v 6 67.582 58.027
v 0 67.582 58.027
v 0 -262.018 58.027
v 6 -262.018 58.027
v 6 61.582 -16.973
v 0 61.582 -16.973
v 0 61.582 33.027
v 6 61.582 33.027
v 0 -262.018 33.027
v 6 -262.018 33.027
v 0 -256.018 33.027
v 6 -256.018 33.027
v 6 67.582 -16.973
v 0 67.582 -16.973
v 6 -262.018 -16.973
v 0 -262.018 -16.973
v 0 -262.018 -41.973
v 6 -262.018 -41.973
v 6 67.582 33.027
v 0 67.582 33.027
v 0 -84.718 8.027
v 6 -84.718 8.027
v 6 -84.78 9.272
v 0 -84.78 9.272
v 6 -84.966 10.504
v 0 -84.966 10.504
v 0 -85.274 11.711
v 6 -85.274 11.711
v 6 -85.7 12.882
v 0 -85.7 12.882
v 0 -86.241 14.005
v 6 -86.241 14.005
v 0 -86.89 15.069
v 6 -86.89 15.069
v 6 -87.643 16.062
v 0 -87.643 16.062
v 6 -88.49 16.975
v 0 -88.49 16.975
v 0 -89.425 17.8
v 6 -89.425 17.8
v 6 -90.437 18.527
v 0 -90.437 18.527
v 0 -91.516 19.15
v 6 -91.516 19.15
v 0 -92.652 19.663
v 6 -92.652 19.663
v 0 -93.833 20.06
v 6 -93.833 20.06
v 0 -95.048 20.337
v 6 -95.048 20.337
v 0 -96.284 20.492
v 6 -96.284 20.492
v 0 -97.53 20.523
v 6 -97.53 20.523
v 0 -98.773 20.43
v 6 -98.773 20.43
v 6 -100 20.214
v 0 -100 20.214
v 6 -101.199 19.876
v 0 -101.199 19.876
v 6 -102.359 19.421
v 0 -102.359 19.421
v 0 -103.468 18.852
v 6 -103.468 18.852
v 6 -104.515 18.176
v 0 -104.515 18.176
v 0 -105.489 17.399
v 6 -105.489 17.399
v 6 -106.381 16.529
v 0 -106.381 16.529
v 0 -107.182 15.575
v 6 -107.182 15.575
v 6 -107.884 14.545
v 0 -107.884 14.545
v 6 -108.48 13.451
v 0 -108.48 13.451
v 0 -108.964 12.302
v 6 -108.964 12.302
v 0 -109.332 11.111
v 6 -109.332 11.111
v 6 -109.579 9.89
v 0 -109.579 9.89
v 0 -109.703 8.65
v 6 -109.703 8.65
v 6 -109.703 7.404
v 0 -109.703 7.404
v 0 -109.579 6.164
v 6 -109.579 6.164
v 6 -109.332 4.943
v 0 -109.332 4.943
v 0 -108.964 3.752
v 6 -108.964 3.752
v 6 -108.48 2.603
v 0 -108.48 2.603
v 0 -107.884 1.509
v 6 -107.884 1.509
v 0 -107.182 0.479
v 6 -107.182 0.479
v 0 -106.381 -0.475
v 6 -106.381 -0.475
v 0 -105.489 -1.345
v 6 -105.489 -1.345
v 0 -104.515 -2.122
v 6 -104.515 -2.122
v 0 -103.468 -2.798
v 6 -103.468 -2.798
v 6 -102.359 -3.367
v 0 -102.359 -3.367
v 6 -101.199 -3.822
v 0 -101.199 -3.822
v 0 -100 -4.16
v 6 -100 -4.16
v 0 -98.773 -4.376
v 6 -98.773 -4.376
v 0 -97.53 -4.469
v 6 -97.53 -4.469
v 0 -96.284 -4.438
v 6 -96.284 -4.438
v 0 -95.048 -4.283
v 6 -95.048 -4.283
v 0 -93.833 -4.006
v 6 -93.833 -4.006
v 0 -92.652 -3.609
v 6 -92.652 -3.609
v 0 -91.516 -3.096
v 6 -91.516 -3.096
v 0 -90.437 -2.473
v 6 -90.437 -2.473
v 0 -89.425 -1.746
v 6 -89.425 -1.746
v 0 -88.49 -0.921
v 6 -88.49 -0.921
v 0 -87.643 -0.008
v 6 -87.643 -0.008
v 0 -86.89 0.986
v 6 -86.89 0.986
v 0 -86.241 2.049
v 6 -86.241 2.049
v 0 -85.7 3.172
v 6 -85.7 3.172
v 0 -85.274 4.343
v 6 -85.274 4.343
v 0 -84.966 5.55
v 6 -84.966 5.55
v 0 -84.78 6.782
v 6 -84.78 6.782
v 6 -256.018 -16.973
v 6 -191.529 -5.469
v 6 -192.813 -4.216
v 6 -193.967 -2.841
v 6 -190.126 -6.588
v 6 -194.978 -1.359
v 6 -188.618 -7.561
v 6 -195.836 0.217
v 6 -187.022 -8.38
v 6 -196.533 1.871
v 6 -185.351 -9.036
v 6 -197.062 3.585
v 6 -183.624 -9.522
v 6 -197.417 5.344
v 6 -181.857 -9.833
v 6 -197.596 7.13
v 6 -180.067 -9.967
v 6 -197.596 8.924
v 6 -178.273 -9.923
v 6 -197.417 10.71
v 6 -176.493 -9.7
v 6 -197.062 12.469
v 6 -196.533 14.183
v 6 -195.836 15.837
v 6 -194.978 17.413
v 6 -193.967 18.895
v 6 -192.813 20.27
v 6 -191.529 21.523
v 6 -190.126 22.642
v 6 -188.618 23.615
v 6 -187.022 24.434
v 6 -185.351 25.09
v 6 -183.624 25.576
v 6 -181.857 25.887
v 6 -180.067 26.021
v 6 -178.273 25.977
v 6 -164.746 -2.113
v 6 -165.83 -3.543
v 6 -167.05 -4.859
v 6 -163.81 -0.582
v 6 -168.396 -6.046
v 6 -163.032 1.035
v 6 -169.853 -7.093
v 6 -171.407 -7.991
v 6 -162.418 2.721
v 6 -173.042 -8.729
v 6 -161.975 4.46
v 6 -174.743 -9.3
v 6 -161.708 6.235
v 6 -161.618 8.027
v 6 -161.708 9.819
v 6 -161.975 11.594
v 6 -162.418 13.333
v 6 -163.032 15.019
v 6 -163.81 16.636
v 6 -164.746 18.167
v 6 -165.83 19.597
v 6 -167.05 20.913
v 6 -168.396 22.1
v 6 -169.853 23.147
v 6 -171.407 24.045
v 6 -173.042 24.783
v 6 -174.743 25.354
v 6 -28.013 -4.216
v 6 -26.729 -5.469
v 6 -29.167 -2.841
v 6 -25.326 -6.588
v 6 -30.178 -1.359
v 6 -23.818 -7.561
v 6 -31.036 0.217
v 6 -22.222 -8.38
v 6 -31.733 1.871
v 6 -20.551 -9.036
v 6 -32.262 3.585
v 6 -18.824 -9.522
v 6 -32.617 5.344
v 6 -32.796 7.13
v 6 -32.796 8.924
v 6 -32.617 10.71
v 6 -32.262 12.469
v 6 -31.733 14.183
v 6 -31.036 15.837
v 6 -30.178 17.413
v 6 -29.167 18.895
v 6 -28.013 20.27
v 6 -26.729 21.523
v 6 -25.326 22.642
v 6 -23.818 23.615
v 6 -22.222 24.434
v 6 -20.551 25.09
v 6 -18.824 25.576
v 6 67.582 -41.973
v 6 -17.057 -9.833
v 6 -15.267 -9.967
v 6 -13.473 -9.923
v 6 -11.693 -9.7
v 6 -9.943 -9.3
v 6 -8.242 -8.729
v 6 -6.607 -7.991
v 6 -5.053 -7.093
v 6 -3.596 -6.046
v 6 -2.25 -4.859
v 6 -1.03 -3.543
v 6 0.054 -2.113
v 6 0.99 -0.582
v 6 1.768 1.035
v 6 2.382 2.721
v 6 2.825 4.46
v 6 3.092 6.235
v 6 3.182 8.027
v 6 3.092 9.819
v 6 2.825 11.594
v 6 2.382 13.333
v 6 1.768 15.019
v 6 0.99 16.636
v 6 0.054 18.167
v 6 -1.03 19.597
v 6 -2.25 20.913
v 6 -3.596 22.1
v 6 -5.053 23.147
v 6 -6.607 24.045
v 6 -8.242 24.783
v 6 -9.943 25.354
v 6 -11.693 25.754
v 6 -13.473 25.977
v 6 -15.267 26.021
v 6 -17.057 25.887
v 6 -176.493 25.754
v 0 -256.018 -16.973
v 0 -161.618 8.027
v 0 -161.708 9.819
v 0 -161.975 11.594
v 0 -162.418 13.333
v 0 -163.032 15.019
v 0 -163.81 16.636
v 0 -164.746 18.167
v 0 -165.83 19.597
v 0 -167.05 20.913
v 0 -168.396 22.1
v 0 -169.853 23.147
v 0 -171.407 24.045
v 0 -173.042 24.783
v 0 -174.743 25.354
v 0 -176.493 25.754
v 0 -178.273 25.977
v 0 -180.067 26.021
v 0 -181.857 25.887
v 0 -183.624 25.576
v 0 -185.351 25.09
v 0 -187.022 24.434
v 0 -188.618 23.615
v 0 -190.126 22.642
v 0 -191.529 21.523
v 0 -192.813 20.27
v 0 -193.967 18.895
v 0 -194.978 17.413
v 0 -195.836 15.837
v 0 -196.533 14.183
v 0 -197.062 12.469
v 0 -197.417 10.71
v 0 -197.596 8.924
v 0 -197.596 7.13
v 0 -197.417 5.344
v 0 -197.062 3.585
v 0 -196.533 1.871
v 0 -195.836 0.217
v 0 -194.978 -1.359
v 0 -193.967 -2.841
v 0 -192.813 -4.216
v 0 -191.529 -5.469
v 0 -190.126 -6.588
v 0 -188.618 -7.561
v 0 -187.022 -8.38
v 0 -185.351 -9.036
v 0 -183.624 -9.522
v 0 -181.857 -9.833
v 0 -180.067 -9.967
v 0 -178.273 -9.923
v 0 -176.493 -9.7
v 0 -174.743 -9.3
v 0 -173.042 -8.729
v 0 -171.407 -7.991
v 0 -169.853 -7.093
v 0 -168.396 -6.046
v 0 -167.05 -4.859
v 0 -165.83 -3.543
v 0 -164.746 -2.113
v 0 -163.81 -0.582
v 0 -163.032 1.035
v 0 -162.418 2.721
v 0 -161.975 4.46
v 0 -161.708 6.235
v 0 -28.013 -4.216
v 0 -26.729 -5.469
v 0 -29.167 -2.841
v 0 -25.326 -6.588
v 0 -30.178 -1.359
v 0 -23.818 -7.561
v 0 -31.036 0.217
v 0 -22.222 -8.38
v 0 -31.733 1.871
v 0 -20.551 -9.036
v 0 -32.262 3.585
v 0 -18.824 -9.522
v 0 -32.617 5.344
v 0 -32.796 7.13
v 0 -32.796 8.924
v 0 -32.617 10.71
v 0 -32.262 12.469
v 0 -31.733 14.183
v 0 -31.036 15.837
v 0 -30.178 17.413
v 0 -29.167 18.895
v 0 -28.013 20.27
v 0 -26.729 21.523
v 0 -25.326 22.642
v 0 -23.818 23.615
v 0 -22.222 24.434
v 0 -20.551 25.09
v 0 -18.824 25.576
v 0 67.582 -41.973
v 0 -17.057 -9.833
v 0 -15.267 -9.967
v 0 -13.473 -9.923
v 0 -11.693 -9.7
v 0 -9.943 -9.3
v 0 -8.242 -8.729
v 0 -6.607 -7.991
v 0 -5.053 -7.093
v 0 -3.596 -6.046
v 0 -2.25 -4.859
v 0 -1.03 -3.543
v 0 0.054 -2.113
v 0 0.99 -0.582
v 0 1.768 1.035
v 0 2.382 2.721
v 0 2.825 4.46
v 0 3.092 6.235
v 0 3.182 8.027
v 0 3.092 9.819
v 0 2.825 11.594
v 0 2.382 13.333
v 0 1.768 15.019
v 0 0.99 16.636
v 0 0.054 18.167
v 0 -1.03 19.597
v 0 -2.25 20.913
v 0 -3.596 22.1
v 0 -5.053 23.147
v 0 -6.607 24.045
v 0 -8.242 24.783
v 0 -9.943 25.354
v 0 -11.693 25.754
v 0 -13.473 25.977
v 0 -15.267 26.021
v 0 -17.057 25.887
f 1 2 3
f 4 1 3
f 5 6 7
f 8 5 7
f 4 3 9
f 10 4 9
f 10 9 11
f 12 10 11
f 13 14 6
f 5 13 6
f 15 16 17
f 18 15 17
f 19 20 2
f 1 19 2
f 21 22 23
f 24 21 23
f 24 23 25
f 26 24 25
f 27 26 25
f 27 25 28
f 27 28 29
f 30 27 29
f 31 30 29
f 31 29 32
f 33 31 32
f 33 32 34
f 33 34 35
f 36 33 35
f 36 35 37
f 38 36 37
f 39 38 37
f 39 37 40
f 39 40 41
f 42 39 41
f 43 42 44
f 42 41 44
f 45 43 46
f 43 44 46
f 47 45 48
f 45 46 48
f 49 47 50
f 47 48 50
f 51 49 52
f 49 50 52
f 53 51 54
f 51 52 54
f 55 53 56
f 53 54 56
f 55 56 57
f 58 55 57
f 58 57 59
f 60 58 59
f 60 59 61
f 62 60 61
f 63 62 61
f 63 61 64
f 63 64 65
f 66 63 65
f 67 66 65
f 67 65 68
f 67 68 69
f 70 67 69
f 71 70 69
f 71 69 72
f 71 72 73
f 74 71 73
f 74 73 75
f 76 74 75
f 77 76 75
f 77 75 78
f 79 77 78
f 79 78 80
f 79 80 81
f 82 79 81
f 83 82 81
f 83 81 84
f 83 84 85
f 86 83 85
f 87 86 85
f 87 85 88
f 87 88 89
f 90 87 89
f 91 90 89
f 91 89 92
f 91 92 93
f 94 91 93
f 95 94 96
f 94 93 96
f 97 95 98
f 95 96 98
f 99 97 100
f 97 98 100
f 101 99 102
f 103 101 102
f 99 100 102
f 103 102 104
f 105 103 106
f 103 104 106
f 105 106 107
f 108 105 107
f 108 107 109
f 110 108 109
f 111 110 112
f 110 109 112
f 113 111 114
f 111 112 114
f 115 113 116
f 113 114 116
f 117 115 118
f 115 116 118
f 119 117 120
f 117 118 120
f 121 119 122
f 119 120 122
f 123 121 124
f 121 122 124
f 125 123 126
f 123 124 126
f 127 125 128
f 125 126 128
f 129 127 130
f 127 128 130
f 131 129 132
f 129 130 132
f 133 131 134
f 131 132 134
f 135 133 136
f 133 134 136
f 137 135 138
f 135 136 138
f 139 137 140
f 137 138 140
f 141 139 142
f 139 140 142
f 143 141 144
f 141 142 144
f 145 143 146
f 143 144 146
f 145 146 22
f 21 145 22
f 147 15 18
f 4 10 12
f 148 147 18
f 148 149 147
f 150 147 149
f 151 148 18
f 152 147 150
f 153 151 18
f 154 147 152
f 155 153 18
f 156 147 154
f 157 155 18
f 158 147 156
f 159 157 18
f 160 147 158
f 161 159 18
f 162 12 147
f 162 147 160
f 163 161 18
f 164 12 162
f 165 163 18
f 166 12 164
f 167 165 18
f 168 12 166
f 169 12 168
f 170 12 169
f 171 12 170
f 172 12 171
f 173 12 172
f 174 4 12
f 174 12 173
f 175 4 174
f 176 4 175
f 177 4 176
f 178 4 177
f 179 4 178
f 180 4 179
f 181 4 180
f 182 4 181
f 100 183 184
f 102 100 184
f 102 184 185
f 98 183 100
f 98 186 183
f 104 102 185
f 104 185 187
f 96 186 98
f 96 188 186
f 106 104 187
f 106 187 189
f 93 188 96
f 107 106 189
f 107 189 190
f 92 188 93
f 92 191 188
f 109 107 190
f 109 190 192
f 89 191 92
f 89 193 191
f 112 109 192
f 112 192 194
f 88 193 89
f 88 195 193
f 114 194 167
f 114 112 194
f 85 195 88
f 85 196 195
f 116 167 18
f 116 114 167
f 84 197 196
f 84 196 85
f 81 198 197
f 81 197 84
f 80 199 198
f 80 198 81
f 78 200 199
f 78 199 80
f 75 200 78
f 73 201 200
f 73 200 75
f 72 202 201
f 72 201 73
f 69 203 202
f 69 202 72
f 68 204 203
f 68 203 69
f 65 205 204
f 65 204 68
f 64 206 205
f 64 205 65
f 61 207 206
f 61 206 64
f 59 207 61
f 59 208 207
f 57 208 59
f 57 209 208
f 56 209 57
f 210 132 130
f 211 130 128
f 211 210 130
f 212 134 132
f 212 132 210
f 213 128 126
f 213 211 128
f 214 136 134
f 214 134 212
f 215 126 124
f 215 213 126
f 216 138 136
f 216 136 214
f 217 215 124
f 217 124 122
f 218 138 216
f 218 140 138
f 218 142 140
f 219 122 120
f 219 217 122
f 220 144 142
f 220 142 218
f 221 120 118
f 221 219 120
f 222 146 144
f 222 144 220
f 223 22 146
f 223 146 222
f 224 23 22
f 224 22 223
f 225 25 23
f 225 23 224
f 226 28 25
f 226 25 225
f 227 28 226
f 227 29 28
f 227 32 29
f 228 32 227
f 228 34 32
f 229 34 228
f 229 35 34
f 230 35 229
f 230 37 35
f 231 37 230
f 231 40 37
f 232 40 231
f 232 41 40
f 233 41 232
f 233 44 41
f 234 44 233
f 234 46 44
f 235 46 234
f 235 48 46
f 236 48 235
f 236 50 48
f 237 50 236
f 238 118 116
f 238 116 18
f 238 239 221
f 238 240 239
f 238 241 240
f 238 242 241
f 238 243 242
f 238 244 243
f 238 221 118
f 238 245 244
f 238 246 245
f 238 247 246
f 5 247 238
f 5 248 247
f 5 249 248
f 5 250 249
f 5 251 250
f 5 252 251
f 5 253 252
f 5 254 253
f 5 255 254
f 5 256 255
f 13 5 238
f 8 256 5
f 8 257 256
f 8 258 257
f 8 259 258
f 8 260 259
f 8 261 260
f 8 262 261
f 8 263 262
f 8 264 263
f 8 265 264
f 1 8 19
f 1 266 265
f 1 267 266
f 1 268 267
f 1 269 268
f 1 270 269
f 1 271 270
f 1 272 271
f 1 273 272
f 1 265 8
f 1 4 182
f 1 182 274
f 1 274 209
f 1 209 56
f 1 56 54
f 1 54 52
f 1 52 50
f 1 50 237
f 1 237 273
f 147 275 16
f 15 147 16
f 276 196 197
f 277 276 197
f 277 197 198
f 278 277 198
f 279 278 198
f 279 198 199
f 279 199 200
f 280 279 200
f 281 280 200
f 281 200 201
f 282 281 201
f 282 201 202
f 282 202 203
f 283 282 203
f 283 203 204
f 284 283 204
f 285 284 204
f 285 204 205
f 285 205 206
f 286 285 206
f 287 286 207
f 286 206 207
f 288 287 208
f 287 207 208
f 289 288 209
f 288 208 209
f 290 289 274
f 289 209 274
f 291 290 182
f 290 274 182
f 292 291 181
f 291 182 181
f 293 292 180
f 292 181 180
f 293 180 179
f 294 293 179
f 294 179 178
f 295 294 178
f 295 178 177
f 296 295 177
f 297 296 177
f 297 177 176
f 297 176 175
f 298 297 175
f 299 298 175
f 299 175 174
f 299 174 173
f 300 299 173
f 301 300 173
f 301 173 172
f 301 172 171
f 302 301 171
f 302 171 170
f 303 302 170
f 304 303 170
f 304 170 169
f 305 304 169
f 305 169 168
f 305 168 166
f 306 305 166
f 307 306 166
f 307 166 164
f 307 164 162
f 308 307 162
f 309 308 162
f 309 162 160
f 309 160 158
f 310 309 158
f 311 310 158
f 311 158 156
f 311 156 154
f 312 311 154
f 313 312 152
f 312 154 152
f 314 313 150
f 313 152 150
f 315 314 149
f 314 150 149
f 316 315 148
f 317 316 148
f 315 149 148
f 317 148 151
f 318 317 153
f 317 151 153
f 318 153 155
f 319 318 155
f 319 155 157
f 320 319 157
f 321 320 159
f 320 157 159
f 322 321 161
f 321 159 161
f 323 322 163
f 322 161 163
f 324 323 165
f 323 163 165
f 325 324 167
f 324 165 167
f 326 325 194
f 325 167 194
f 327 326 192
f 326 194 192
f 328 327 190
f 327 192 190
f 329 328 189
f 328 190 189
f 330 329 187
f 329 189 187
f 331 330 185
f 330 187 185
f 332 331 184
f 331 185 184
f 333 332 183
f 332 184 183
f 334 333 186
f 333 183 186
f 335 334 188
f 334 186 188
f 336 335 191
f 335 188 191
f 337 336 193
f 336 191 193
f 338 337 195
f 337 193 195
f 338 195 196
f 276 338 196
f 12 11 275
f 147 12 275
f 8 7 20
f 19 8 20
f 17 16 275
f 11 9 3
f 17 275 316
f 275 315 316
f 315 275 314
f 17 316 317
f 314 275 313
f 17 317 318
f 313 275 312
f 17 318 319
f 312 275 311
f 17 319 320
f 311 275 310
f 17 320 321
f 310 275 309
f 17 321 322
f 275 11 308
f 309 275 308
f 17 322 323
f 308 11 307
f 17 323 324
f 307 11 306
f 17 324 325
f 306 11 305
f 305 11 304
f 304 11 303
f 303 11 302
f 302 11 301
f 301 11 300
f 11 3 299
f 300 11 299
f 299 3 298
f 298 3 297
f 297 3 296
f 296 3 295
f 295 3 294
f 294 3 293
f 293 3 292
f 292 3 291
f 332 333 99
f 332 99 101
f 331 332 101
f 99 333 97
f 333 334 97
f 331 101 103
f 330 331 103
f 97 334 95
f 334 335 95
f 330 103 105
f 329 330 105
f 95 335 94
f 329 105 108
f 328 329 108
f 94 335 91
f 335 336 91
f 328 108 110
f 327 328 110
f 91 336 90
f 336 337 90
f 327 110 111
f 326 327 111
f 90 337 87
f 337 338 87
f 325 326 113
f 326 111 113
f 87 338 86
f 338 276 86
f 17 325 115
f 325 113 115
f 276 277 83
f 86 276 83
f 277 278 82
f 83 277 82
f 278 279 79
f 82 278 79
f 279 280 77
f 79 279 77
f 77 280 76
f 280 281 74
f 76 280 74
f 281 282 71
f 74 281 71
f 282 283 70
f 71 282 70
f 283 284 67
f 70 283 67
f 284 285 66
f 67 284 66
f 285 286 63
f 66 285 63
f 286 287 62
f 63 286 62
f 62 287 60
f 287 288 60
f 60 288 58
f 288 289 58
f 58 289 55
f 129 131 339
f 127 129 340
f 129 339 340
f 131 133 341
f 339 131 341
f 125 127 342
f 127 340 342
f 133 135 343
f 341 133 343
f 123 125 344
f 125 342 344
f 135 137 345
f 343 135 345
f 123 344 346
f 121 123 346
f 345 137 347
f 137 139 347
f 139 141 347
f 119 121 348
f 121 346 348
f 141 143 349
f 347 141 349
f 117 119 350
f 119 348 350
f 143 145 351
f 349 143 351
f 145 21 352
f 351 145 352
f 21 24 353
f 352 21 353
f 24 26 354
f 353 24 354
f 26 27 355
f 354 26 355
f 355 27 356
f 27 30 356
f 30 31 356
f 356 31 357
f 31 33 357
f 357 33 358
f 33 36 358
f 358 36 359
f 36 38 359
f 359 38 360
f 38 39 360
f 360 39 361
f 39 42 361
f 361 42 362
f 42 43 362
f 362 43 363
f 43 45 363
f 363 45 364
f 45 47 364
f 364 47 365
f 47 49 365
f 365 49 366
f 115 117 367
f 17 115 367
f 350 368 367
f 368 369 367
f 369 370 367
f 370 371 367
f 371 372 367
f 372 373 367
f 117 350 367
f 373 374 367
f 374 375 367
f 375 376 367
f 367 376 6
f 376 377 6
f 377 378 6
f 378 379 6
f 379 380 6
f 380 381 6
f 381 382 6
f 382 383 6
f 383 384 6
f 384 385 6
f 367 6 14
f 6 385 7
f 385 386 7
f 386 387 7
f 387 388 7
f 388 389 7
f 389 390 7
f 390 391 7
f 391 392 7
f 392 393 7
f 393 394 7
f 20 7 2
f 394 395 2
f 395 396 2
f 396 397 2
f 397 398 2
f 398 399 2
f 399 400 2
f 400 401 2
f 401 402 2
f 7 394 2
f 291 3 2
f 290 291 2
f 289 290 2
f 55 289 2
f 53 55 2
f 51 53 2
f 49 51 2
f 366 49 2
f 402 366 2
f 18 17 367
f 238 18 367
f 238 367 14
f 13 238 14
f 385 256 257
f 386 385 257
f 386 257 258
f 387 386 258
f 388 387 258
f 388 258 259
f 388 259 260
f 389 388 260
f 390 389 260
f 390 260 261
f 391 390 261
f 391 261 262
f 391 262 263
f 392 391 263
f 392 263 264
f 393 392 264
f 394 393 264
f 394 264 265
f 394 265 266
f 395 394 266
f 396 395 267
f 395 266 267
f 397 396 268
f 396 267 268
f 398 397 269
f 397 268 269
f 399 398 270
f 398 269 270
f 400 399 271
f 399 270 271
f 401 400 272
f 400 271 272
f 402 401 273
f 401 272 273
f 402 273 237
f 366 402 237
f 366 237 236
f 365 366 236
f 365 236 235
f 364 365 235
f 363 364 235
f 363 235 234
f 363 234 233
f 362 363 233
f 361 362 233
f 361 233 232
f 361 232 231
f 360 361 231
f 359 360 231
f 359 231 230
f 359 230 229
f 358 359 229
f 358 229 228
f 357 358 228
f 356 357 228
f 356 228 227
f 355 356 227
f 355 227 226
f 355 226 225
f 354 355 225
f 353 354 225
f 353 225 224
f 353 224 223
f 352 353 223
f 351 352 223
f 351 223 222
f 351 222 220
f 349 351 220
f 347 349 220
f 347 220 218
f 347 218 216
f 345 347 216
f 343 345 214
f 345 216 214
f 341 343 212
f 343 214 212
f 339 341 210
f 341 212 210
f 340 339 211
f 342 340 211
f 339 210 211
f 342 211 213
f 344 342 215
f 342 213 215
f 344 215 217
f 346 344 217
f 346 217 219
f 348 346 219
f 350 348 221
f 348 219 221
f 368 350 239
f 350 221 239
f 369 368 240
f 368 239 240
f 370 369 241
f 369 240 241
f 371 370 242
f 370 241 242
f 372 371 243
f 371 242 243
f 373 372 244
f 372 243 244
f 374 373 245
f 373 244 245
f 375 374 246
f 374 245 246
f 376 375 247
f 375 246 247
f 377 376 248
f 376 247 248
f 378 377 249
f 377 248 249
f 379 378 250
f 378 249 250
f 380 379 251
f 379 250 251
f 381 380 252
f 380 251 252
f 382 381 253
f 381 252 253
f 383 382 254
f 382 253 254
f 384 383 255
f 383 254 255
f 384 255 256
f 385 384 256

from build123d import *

# Parameters (mm, degrees)
F1_DEPTH = 6
F2_R     = 18
F2_R_2   = 12.5
F3_DEPTH = 25


with BuildPart() as f1:
    # F0 (on Right) → F1 (new body)
    with BuildSketch(Plane.YZ):
        Polygon((61.581665, 58.027008), (-256.018335, 58.027008), (-262.018335, 58.027008), (-262.018335, 33.027008), (-256.018335, 33.027008), (-256.018335, -16.972992), (-262.018335, -16.972992), (-262.018335, -41.972992), (-256.018335, -41.972992), (61.581665, -41.972992), (67.581665, -41.972992), (67.581665, -16.972992), (61.581665, -16.972992), (61.581665, 33.027008), (67.581665, 33.027008), (67.581665, 58.027008), align=None)
    extrude(amount=F1_DEPTH)

    # F2 (on face) → F3 (cut)
    with BuildSketch(Plane.YZ.offset(6)):
        with Locations((-179.618335, 8.027008)):
            Circle(F2_R)
        with Locations((-97.218335, 8.027008)):
            Circle(F2_R_2)
        with Locations((-14.818335, 8.027008)):
            Circle(F2_R)
    extrude(amount=-F3_DEPTH, mode=Mode.SUBTRACT)


solid = f1.part
